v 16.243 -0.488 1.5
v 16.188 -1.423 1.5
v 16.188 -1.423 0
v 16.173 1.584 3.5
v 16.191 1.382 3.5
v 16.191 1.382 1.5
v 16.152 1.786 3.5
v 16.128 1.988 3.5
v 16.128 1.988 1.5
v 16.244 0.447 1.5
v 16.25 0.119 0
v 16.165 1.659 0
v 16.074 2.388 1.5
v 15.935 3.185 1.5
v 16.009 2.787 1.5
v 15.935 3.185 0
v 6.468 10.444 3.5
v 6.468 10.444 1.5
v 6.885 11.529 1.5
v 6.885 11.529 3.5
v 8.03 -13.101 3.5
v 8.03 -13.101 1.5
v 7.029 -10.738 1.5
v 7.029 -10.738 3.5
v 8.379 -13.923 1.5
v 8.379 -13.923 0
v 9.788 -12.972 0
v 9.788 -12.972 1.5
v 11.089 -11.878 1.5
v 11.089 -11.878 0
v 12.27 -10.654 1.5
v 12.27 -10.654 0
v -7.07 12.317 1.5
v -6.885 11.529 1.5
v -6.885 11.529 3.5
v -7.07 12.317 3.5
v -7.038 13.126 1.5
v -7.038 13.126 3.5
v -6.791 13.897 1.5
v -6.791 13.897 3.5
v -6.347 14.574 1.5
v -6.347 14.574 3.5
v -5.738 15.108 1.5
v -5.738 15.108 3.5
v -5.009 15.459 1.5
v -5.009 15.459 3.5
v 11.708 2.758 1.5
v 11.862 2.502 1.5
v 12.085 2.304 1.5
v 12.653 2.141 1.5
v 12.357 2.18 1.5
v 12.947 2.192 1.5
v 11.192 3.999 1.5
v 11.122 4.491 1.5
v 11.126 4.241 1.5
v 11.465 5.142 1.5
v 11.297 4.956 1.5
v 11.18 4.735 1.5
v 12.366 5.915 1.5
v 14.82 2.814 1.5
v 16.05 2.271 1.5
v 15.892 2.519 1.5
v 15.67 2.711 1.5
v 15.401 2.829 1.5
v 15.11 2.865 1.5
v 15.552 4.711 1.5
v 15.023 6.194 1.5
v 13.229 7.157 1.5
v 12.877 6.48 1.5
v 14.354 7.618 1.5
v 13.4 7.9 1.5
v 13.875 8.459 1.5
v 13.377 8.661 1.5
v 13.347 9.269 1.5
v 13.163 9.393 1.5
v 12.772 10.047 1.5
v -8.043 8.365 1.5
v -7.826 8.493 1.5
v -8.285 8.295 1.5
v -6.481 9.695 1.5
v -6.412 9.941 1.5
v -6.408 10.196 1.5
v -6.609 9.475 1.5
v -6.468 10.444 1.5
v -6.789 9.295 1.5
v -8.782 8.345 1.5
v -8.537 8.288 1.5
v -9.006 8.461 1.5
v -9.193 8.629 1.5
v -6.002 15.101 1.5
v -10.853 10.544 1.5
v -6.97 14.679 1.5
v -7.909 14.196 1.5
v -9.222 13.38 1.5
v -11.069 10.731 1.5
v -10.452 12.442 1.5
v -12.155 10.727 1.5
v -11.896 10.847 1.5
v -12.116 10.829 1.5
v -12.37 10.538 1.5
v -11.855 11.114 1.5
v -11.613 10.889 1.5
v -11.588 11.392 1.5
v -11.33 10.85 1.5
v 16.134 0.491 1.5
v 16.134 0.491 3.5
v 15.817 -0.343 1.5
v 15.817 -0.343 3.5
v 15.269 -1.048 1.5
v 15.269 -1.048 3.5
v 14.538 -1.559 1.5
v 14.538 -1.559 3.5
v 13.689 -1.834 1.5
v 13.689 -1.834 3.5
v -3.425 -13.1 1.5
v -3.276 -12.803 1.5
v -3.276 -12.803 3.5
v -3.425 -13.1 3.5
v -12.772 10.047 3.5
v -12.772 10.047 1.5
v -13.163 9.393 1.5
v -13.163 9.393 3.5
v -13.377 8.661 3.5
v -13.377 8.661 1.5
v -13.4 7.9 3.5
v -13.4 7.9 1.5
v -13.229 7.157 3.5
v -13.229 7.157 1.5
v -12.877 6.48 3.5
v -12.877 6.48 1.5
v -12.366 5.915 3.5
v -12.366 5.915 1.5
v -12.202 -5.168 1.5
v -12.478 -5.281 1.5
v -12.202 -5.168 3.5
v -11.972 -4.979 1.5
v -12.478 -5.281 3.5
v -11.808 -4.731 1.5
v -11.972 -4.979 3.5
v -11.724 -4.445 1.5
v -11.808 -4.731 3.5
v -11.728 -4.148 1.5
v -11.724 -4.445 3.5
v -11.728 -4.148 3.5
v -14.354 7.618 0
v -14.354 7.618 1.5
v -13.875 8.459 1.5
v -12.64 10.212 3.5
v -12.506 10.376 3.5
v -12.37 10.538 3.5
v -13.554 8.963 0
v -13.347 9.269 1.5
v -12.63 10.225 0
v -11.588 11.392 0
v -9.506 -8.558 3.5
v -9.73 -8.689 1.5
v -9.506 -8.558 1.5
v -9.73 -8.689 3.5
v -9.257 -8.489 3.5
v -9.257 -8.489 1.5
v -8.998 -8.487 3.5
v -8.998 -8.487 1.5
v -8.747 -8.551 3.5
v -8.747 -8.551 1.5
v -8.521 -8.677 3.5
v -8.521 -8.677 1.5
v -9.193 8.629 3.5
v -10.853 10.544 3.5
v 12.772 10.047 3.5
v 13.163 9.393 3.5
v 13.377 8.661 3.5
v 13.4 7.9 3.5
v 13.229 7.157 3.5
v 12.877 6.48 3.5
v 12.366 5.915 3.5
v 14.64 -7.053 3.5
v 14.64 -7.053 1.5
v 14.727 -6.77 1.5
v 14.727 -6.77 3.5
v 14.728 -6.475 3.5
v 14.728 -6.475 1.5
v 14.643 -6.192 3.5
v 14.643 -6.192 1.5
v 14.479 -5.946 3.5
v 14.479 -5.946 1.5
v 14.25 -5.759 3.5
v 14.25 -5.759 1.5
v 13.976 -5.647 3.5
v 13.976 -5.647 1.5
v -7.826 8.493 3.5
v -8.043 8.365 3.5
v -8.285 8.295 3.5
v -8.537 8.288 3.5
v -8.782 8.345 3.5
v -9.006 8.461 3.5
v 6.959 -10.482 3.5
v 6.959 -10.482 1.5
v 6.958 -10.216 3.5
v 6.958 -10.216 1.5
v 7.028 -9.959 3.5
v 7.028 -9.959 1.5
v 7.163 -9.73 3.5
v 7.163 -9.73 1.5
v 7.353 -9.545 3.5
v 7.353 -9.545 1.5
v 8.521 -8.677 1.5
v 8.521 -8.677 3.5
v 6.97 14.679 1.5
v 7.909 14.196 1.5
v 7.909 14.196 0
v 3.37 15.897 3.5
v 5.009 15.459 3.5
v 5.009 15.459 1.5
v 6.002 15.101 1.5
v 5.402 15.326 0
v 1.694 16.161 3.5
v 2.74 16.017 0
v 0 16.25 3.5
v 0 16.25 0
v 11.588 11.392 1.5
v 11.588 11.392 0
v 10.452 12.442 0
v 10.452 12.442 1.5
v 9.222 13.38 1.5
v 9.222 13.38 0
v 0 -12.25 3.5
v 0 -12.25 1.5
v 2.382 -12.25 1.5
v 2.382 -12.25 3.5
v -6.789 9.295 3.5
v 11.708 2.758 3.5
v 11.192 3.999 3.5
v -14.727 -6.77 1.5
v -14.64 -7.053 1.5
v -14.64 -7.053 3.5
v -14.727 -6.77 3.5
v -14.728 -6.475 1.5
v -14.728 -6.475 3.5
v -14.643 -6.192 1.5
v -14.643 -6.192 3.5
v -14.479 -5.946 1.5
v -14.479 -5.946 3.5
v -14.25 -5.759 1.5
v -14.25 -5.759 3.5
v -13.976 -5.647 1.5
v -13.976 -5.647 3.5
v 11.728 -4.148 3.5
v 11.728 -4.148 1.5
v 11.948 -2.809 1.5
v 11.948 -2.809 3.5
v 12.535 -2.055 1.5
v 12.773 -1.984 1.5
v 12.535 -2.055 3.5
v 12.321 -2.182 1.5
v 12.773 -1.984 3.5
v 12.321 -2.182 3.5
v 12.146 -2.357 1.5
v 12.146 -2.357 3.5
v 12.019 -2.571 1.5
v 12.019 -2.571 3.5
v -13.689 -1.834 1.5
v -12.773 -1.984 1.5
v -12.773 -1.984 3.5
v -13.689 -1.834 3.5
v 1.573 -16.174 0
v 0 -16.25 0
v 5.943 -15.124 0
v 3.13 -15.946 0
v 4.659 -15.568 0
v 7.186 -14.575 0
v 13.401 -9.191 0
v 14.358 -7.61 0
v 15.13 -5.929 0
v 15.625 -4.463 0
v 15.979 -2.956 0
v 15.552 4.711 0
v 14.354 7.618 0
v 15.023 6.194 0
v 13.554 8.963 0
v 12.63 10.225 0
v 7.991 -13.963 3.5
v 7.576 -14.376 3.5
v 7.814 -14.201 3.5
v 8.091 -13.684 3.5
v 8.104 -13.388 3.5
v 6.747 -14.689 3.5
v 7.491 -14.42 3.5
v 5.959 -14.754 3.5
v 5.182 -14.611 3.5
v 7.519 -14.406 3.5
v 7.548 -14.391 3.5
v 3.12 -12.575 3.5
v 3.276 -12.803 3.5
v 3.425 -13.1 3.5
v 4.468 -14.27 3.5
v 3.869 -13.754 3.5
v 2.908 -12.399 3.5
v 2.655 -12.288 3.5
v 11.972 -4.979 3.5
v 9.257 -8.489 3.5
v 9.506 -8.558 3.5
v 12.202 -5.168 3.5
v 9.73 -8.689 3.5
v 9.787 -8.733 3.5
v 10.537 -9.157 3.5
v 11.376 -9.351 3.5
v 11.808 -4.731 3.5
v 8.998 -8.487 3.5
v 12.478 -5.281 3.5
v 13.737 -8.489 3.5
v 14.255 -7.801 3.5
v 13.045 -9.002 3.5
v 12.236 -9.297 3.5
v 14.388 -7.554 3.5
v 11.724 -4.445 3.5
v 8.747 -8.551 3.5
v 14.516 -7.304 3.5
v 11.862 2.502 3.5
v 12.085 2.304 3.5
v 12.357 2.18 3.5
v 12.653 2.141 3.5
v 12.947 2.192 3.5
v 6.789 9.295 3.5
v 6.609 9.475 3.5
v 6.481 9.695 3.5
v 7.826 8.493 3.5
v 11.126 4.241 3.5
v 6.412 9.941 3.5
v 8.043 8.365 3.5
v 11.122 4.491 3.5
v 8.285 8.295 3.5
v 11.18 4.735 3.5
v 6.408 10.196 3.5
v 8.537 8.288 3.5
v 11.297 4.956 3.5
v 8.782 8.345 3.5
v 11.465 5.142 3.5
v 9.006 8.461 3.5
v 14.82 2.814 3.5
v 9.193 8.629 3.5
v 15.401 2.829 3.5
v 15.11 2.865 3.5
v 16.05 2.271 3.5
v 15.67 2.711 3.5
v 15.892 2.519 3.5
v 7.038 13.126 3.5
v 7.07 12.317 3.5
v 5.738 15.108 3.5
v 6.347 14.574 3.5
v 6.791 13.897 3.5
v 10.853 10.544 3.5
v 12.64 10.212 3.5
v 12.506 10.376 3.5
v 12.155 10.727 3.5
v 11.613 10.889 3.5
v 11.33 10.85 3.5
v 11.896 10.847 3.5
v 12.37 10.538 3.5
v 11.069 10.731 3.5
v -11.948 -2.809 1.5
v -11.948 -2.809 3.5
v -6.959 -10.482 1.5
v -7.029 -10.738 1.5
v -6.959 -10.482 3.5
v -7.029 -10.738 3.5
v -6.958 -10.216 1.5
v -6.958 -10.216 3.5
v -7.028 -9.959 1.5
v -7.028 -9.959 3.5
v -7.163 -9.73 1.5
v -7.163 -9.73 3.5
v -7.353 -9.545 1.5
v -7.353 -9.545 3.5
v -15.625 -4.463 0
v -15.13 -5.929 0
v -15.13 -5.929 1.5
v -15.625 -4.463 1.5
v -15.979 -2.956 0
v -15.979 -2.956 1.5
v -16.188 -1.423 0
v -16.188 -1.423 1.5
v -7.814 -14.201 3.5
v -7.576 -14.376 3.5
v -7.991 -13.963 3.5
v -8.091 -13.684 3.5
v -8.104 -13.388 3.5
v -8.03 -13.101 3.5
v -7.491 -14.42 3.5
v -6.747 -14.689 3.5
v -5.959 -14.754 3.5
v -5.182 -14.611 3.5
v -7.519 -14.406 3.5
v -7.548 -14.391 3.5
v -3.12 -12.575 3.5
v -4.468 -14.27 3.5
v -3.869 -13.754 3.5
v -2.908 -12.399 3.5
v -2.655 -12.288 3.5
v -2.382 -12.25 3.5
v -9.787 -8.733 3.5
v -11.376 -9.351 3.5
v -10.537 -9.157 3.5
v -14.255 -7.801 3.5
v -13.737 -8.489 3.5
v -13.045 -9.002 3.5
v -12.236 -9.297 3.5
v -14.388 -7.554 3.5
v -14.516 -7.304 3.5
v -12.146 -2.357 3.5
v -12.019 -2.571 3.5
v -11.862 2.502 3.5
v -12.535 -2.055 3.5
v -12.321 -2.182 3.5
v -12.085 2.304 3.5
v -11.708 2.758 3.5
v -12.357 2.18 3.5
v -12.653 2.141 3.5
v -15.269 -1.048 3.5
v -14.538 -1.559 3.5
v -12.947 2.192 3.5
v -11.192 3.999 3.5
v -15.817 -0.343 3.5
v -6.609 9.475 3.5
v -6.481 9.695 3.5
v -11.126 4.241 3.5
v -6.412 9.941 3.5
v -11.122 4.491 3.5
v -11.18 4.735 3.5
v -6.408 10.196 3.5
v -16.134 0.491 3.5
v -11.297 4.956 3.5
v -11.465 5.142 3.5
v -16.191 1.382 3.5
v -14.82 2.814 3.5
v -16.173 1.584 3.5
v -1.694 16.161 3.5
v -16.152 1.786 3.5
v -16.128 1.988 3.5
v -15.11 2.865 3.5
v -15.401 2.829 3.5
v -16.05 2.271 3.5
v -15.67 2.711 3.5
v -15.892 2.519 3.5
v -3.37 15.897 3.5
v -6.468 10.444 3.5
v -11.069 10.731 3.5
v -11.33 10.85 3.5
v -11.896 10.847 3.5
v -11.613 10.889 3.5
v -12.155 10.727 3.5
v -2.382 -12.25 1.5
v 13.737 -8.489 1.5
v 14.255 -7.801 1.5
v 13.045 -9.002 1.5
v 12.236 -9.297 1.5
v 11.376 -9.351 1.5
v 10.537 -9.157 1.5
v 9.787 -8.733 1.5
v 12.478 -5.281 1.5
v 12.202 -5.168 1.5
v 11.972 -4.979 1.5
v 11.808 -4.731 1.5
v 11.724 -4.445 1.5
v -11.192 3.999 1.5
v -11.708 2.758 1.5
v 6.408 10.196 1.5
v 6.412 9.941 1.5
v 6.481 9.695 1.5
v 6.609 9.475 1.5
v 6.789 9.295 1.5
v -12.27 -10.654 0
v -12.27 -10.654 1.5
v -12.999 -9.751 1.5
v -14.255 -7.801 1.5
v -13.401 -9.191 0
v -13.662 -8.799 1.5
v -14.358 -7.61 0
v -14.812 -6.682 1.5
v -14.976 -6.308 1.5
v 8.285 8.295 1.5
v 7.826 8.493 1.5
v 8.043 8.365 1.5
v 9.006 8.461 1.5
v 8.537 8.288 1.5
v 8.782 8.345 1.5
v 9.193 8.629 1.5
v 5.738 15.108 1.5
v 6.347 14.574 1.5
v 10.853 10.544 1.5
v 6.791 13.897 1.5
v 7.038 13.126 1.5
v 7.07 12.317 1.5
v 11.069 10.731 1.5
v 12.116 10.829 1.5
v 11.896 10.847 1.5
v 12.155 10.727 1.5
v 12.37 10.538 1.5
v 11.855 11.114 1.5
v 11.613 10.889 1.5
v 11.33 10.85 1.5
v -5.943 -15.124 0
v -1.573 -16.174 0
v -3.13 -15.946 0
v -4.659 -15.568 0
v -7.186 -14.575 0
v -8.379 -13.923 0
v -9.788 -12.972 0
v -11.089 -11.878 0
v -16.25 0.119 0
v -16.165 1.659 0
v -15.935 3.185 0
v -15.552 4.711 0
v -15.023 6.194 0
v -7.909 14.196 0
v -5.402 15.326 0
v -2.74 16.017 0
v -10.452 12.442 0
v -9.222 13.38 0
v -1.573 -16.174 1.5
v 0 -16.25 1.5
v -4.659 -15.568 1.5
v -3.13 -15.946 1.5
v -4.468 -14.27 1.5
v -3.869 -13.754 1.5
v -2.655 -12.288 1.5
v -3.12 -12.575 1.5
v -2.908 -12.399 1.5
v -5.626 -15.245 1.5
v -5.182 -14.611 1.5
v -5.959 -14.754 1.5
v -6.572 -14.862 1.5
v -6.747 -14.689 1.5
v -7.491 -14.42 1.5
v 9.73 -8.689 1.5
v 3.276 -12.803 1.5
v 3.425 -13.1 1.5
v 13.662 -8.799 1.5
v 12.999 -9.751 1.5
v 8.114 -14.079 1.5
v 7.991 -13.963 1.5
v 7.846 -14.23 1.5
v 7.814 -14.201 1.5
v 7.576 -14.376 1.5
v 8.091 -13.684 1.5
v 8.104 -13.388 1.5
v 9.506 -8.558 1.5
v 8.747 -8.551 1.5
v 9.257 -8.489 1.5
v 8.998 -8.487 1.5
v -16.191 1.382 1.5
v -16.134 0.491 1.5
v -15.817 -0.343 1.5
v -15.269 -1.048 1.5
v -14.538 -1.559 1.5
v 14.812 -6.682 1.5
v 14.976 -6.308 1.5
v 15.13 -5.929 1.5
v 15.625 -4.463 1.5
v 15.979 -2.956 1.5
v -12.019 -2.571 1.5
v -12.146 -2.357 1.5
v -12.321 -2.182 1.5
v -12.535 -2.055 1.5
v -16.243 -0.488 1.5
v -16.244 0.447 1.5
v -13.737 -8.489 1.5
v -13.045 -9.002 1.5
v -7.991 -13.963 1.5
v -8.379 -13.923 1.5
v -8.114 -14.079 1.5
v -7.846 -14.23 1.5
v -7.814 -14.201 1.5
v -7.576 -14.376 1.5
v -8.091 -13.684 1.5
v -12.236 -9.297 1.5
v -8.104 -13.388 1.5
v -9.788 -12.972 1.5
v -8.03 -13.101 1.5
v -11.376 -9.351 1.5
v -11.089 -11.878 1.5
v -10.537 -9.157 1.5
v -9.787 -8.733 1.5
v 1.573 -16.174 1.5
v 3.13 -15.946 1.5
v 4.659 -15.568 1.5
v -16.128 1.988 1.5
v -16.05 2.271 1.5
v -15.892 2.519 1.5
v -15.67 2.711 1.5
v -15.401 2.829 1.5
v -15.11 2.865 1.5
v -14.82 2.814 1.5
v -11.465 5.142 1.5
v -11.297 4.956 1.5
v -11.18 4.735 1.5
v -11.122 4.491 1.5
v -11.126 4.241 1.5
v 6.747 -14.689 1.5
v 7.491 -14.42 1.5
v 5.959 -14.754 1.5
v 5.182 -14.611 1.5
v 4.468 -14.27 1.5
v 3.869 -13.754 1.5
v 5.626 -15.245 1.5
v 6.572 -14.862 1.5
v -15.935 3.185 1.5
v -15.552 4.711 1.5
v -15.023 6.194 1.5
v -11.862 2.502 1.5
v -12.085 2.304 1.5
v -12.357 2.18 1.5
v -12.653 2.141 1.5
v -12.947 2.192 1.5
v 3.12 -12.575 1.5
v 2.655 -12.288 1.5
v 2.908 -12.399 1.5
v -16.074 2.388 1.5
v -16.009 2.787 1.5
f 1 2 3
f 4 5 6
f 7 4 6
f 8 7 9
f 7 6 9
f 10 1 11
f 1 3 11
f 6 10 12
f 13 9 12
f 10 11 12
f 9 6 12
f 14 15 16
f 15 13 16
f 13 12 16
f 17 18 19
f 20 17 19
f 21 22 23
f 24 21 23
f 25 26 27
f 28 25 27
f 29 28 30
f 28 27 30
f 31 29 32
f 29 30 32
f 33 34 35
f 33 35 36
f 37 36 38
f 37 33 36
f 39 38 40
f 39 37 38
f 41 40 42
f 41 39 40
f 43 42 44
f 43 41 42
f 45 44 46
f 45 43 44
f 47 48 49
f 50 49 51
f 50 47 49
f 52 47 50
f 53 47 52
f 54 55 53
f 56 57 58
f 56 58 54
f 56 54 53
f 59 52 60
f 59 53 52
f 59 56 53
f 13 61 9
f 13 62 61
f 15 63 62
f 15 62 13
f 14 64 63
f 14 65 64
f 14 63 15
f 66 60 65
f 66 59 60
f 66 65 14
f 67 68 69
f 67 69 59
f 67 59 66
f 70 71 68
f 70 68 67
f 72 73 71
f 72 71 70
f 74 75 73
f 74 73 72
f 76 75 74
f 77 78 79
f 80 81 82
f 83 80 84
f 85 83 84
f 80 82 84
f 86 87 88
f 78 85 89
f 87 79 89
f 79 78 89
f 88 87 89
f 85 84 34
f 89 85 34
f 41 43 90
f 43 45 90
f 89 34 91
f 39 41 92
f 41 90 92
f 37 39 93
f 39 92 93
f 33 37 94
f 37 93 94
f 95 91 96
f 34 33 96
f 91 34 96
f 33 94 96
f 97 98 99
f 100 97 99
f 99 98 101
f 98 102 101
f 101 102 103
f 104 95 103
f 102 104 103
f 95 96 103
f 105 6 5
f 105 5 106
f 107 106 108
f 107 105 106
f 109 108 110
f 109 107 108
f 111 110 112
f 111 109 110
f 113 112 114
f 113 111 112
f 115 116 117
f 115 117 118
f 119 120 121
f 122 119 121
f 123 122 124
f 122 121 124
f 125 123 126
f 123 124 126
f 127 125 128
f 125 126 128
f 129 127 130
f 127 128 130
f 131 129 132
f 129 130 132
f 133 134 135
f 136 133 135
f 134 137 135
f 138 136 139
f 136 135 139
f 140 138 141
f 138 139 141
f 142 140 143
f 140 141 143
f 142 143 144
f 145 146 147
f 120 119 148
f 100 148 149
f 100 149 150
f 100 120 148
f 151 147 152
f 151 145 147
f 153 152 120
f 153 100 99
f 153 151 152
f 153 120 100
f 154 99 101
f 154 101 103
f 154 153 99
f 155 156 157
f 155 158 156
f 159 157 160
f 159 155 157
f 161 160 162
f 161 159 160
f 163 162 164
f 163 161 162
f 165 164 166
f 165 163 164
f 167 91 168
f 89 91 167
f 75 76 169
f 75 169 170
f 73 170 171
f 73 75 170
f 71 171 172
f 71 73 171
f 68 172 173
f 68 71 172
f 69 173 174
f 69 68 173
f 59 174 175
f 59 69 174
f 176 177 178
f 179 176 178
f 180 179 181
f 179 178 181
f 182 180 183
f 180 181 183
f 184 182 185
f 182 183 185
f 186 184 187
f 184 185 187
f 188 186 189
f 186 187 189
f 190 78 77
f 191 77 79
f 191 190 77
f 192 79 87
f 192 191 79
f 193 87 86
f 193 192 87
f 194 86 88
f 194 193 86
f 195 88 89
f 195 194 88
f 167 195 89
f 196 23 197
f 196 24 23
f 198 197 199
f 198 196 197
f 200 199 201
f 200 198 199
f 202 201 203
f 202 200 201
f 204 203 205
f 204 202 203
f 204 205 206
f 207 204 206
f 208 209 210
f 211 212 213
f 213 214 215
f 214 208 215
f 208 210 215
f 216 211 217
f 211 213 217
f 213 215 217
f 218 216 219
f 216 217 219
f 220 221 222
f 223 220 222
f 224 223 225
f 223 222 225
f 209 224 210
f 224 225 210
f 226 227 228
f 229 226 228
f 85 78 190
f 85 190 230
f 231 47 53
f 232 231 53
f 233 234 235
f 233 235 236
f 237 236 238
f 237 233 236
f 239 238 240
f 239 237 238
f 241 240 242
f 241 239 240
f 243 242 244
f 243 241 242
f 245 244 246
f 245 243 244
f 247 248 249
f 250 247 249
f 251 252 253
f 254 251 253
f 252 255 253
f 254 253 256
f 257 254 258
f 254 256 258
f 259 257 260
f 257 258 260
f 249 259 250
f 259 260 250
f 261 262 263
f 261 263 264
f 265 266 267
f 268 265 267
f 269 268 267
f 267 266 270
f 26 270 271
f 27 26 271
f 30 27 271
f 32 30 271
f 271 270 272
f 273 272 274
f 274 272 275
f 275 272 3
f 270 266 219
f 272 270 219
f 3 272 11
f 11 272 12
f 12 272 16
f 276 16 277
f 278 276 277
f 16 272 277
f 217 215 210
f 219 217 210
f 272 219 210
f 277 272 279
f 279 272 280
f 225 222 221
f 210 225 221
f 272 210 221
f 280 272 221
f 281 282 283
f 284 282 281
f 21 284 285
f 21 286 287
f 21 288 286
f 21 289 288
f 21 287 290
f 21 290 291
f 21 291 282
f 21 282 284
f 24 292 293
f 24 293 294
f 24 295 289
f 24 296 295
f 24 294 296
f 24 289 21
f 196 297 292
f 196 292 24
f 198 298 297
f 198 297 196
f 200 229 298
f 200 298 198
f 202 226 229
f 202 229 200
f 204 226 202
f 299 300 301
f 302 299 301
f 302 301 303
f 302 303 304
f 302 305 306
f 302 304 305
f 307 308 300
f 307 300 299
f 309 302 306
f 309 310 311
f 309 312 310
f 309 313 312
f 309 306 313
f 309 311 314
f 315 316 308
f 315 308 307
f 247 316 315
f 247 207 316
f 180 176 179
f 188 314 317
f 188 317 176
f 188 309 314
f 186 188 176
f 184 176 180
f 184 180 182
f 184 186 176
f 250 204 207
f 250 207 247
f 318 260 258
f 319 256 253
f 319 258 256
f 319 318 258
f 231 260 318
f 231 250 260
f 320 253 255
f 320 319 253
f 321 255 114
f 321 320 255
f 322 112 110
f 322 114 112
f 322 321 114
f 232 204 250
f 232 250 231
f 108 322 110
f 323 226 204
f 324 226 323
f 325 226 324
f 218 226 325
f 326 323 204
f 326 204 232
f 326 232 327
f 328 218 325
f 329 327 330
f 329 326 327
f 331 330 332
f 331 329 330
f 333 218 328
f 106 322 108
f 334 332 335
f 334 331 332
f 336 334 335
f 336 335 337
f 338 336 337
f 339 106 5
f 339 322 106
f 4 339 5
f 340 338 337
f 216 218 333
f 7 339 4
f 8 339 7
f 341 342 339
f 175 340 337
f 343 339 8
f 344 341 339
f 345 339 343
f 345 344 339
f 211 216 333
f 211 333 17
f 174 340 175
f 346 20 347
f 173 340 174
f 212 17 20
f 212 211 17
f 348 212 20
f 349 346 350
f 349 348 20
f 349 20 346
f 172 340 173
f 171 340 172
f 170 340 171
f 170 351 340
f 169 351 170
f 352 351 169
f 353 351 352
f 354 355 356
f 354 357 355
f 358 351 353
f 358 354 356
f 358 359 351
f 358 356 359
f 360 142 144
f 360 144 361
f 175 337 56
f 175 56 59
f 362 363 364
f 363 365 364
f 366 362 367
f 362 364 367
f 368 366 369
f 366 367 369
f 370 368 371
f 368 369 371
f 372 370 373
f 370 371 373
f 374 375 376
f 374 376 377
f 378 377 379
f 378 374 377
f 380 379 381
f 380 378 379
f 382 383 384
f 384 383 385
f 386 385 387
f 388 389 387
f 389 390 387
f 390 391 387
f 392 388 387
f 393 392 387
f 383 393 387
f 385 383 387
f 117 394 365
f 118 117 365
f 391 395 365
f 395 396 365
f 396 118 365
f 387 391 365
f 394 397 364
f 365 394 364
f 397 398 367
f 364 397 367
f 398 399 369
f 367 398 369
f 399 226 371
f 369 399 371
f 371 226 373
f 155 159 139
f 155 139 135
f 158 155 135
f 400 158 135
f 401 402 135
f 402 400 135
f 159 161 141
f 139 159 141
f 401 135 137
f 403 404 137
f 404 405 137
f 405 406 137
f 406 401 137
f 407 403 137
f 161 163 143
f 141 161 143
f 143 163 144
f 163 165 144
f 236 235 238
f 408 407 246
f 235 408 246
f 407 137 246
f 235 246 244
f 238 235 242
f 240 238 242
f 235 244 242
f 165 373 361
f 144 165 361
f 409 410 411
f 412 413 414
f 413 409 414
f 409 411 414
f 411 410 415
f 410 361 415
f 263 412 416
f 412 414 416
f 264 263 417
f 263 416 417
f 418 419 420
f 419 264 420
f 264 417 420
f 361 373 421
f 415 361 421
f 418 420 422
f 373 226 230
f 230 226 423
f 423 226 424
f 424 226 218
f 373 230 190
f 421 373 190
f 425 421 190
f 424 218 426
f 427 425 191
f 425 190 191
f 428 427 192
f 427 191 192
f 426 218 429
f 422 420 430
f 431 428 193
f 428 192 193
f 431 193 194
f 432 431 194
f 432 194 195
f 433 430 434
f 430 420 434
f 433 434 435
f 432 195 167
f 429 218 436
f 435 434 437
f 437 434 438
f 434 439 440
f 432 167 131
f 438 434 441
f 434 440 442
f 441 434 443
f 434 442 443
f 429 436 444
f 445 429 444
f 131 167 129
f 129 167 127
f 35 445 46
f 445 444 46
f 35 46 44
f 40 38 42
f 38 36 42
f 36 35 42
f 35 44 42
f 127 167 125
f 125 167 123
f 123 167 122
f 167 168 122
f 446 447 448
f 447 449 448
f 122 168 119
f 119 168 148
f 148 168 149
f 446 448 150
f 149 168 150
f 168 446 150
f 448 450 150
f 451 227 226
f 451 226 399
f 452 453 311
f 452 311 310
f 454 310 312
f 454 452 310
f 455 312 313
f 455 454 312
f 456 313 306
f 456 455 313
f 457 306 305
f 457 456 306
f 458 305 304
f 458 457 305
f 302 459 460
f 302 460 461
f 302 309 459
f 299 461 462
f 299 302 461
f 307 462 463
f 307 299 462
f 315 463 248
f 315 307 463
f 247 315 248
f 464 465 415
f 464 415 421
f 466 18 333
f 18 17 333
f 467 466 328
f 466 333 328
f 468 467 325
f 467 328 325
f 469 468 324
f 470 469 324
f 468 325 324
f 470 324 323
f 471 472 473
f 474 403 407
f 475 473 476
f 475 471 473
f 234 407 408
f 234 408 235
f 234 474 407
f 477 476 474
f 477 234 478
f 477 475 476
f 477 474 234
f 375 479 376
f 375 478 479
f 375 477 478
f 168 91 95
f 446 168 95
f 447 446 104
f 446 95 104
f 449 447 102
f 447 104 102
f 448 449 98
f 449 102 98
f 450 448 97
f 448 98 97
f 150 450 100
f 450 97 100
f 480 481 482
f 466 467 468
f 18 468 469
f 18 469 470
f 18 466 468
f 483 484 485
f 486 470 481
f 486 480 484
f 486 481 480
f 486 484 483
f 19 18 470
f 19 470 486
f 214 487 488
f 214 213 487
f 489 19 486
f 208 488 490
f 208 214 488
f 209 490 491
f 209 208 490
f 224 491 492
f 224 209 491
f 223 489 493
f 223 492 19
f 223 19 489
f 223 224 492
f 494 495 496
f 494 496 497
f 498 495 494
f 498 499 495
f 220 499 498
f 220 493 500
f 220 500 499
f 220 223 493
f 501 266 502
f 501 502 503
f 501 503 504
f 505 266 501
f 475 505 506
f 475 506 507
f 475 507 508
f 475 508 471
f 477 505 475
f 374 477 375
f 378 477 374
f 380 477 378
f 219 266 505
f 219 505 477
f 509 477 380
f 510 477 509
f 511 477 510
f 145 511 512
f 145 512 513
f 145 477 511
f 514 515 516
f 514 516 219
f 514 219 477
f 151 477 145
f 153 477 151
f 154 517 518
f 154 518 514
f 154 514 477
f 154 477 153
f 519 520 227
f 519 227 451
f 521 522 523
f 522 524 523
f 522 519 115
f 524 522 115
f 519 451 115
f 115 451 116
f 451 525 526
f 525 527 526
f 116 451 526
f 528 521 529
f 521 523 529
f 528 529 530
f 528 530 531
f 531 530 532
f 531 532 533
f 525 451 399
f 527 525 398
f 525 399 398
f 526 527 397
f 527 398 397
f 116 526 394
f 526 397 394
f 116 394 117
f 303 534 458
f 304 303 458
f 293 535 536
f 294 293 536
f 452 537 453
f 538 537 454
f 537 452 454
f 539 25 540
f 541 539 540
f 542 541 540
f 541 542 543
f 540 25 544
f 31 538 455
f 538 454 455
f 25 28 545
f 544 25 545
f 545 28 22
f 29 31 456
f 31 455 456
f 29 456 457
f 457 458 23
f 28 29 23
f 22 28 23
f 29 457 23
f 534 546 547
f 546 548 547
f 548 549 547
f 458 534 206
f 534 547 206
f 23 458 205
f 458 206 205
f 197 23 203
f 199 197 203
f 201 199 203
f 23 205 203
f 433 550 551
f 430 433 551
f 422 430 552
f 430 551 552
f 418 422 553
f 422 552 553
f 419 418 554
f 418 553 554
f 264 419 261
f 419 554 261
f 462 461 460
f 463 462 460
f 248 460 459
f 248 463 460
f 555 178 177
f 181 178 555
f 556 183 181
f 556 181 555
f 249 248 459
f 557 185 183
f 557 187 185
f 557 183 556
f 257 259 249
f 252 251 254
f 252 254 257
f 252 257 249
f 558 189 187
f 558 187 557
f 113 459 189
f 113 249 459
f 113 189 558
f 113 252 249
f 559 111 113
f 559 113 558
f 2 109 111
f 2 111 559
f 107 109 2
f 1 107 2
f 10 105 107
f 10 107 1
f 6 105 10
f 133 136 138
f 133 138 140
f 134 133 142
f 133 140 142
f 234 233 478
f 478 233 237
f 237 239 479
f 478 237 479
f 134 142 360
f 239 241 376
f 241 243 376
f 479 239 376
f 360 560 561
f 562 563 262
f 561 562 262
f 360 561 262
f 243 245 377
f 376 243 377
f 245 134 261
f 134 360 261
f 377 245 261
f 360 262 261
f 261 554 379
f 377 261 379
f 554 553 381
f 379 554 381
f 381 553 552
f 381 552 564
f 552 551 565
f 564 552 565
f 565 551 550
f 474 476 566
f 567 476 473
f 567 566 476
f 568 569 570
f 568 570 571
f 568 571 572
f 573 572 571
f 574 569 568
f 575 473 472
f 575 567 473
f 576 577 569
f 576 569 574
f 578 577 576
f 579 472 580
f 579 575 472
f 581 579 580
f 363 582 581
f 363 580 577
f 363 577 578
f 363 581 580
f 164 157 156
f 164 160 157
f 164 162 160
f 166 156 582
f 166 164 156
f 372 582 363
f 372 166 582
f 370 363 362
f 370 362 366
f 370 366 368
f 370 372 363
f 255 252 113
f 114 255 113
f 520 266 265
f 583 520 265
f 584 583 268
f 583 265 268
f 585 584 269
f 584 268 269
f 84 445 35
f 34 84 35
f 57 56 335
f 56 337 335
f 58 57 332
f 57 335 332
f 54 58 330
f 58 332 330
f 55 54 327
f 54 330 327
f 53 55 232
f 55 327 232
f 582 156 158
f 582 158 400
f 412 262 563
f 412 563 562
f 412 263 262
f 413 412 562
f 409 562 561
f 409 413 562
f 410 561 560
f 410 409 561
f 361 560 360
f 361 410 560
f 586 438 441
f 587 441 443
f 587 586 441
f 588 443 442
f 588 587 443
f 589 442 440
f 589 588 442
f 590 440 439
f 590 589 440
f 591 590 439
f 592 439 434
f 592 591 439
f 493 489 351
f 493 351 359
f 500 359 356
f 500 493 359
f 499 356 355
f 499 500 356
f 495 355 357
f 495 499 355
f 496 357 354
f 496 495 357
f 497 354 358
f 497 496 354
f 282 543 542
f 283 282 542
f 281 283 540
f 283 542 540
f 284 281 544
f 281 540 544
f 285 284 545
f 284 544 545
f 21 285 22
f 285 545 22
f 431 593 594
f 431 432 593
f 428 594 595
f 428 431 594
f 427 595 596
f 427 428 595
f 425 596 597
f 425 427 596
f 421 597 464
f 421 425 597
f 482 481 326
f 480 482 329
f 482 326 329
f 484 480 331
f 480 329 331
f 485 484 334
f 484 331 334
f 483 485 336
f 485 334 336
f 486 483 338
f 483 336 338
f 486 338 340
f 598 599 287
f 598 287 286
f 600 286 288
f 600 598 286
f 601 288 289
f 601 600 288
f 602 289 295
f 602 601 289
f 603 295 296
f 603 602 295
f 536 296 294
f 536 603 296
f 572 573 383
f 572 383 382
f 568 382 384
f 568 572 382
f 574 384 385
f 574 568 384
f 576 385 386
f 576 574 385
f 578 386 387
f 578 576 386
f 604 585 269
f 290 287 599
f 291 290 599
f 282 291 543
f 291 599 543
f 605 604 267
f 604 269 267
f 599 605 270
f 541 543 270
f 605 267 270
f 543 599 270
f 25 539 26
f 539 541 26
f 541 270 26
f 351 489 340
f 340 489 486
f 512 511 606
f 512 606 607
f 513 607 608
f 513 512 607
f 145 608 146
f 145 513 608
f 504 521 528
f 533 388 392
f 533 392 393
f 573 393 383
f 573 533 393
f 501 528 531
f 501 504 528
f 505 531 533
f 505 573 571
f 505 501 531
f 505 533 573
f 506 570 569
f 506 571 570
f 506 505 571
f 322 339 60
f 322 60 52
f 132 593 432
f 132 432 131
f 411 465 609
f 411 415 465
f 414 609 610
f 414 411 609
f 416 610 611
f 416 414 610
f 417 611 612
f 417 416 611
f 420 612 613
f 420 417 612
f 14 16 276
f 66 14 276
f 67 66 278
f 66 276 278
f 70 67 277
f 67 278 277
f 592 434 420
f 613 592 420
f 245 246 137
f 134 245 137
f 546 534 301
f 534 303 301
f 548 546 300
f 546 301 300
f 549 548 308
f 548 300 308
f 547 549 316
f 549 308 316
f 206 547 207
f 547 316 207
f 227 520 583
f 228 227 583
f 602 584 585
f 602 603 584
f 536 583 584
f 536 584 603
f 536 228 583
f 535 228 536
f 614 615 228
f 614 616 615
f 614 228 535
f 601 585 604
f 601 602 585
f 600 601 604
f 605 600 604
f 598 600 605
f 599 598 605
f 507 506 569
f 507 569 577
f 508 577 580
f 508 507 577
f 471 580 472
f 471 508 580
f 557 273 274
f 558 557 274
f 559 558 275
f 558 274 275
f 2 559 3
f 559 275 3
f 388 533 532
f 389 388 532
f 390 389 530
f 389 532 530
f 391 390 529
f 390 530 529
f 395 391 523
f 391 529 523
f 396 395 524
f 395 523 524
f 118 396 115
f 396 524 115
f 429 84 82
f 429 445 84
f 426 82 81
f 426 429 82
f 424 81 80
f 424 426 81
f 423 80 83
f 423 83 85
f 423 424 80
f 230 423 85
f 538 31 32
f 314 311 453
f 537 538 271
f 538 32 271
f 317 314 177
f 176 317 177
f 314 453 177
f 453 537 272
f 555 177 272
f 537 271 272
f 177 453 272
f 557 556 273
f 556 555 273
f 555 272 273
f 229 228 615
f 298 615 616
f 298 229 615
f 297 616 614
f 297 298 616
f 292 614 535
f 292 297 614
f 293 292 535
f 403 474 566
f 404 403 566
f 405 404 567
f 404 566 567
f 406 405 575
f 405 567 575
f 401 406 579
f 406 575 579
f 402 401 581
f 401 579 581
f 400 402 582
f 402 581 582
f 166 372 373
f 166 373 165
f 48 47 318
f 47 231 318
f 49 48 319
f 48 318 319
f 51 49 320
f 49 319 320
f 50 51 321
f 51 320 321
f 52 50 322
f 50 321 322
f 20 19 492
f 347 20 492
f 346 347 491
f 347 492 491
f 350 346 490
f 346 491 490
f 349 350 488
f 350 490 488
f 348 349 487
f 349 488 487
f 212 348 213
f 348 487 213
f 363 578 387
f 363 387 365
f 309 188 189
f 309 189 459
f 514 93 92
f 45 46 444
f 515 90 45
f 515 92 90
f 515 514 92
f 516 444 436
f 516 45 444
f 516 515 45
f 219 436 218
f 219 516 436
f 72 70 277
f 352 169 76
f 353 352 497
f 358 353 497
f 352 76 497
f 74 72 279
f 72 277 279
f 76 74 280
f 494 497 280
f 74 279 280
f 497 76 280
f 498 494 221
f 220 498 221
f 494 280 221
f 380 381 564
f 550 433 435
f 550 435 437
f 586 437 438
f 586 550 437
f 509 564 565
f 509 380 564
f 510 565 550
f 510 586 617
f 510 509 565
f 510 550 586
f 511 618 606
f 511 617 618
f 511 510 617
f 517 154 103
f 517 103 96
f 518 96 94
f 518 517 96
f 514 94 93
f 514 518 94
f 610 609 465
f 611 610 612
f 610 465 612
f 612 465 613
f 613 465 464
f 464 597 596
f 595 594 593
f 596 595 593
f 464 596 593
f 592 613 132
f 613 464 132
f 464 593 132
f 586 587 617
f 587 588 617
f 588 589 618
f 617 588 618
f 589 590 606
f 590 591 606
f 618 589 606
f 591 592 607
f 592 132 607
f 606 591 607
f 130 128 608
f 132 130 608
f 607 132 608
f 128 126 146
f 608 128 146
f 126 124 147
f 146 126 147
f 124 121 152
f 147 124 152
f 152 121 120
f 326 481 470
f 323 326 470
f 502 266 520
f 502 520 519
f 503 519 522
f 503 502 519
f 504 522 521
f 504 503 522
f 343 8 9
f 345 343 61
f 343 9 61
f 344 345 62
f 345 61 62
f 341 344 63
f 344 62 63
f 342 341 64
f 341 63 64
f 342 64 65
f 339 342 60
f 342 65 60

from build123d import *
from build123d import SkipClean  # not in build123d's __all__

# Parameters (mm, degrees)
F1_DEPTH    = 1.5
F2_DEPTH    = 3.5
F3_R        = 1
F4_R        = 1
F5_T1_DEPTH = 9.63963589
F5_T3_DEPTH = 10.6906794787
F5_T5_DEPTH = 9.0103178495
F5_T7_DEPTH = 9.246443515
F5_T9_DEPTH = 9.9071921997
F6_T1_DEPTH = 4.304276514
F6_T3_DEPTH = 5.0643678136
F6_T5_DEPTH = 5.03100669
F6_T7_DEPTH = 4.8959965939


# Not quite as in the source:
# - a fillet or chamfer that OpenCascade refuses, or shapes differently, is made with other operations: its cross-section is extruded or revolved along the edge and cut away or added
# - a feature names something its author has since deleted; it is built from what else it names


with BuildPart() as f1:
    # F0 (on Top) → F1 (new body)
    with BuildSketch(Plane.XY):
        with BuildLine():
            Line((0, -12.25), (0, -16.25))
            ThreePointArc((0, -16.25), (2.3542947693, -16.0785508097), (4.6589105316, -15.5678210633))
            Line((4.6589105316, -15.5678210633), (3, -12.25))
            Line((3, -12.25), (0, -12.25))
        make_face()
        with BuildLine():
            Line((3, -12.25), (4.6589105316, -15.5678210633))
            ThreePointArc((4.6589105316, -15.5678210633), (6.5703749152, -14.8624585272), (8.3785487777, -13.9234485807))
            Line((8.3785487777, -13.9234485807), (6.722135955, -10.0139320225))
            Line((6.722135955, -10.0139320225), (9.1300793123, -8.2245721403))
            Line((9.1300793123, -8.2245721403), (12.269716972, -10.6544143635))
            ThreePointArc((12.269716972, -10.6544143635), (13.901957351, -8.4141596021), (15.1297175637, -5.9290932226))
            Line((15.1297175637, -5.9290932226), (11.5782397372, -5.0612652418))
            Line((11.5782397372, -5.0612652418), (12.0646680977, -2.1009633231))
            Line((12.0646680977, -2.1009633231), (16.187616292, -1.4225254948))
            ThreePointArc((16.187616292, -1.4225254948), (16.2256082415, 0.890020895), (15.9349057476, 3.184537457))
            Line((15.9349057476, 3.184537457), (12.0646680977, 1.8990366769))
            Line((12.0646680977, 1.8990366769), (10.9139659303, 4.6695753469))
            Line((10.9139659303, 4.6695753469), (14.3535137791, 7.6183424833))
            ThreePointArc((14.3535137791, 7.6183424833), (13.1072409386, 9.6053492897), (11.5878961133, 11.3922413803))
            Line((11.5878961133, 11.3922413803), (8.5738108299, 7.9135966332))
            Line((8.5738108299, 7.9135966332), (6.2013811224, 9.7497821584))
            Line((6.2013811224, 9.7497821584), (7.9085498801, 14.1956802864))
            ThreePointArc((7.9085498801, 14.1956802864), (4.08550458, 15.7280371416), (0, 16.25))
            Line((0, 16.25), (0, -12.25))
            Line((0, -12.25), (3, -12.25))
        make_face()
        with BuildLine():
            Line((6.722135955, -10.0139320225), (8.3785487777, -13.9234485807))
            ThreePointArc((8.3785487777, -13.9234485807), (10.4527204974, -12.4419907653), (12.269716972, -10.6544143635))
            Line((12.269716972, -10.6544143635), (9.1300793123, -8.2245721403))
            Line((9.1300793123, -8.2245721403), (6.722135955, -10.0139320225))
        make_face()
        with BuildLine():
            ThreePointArc((11.5878961133, 11.3922413803), (9.8484856206, 12.9255495427), (7.9085498801, 14.1956802864))
            Line((7.9085498801, 14.1956802864), (6.2013811224, 9.7497821584))
            Line((6.2013811224, 9.7497821584), (8.5738108299, 7.9135966332))
            Line((8.5738108299, 7.9135966332), (11.5878961133, 11.3922413803))
        make_face()
        with BuildLine():
            Line((11.5782397372, -5.0612652418), (15.1297175637, -5.9290932226))
            ThreePointArc((15.1297175637, -5.9290932226), (15.8199601178, -3.7136722892), (16.187616292, -1.4225254948))
            Line((16.187616292, -1.4225254948), (12.0646680977, -2.1009633231))
            Line((12.0646680977, -2.1009633231), (11.5782397372, -5.0612652418))
        make_face()
        with BuildLine():
            ThreePointArc((15.9349057476, 3.184537457), (15.3056115889, 5.4590066762), (14.3535137791, 7.6183424833))
            Line((14.3535137791, 7.6183424833), (10.9139659303, 4.6695753469))
            Line((10.9139659303, 4.6695753469), (12.0646680977, 1.8990366769))
            Line((12.0646680977, 1.8990366769), (15.9349057476, 3.184537457))
        make_face()
    extrude(amount=F1_DEPTH)

    # F0 (on Top) → F2 (join)
    with BuildSketch(Plane.XY):
        with BuildLine():
            Line((3, -12.25), (4.6589105316, -15.5678210633))
            ThreePointArc((4.6589105316, -15.5678210633), (6.5703749152, -14.8624585272), (8.3785487777, -13.9234485807))
            Line((8.3785487777, -13.9234485807), (6.722135955, -10.0139320225))
            Line((6.722135955, -10.0139320225), (9.1300793123, -8.2245721403))
            Line((9.1300793123, -8.2245721403), (12.269716972, -10.6544143635))
            ThreePointArc((12.269716972, -10.6544143635), (13.901957351, -8.4141596021), (15.1297175637, -5.9290932226))
            Line((15.1297175637, -5.9290932226), (11.5782397372, -5.0612652418))
            Line((11.5782397372, -5.0612652418), (12.0646680977, -2.1009633231))
            Line((12.0646680977, -2.1009633231), (16.187616292, -1.4225254948))
            ThreePointArc((16.187616292, -1.4225254948), (16.2256082415, 0.890020895), (15.9349057476, 3.184537457))
            Line((15.9349057476, 3.184537457), (12.0646680977, 1.8990366769))
            Line((12.0646680977, 1.8990366769), (10.9139659303, 4.6695753469))
            Line((10.9139659303, 4.6695753469), (14.3535137791, 7.6183424833))
            ThreePointArc((14.3535137791, 7.6183424833), (13.1072409386, 9.6053492897), (11.5878961133, 11.3922413803))
            Line((11.5878961133, 11.3922413803), (8.5738108299, 7.9135966332))
            Line((8.5738108299, 7.9135966332), (6.2013811224, 9.7497821584))
            Line((6.2013811224, 9.7497821584), (7.9085498801, 14.1956802864))
            ThreePointArc((7.9085498801, 14.1956802864), (4.08550458, 15.7280371416), (0, 16.25))
            Line((0, 16.25), (0, -12.25))
            Line((0, -12.25), (3, -12.25))
        make_face()
    extrude(amount=F2_DEPTH)

    # F3
    f3_edges = [f1.edges().sort_by_distance(p)[0] for p in [
        (3, -12.25, 2.5),
        (9.130079, -8.224572, 2.5),
        (12.064668, -2.100963, 2.5),
        (10.913966, 4.669575, 2.5),
        (6.201381, 9.749782, 2.5),
    ]]
    fillet(f3_edges, radius=F3_R)

    # F4
    f4_edges = [f1.edges().sort_by_distance(p)[0] for p in [
        (12.064668, 1.899037, 2.5),
        (11.57824, -5.061265, 2.5),
        (6.722136, -10.013932, 2.5),
        (8.573811, 7.913597, 2.5),
    ]]
    fillet(f4_edges, radius=F4_R)

    # F5: fillet of radius 3 on 5 edges, made by hand

    # F5_s2 → F5_t1 (cut)
    with BuildSketch(Plane.XY.offset(1.5)):
        with BuildLine():
            ThreePointArc((7.4911310936, -14.4203139681), (5.1815062569, -14.6114030066), (3.4248714726, -13.0997429451))
            Line((3.4248714726, -13.0997429451), (4.6589105316, -15.5678210633))
            ThreePointArc((4.6589105316, -15.5678210633), (6.1020546546, -15.0607911144), (7.4911310936, -14.4203139681))
        make_face()
    extrude(amount=F5_T1_DEPTH, mode=Mode.SUBTRACT)

    # F5_s4 → F5_t3 (cut)
    with BuildSketch(Plane.XY.offset(1.5)):
        with BuildLine():
            ThreePointArc((14.2551270077, -7.800888026), (12.2362296702, -9.2974660849), (9.7872909338, -8.7332042566))
            Line((9.7872909338, -8.7332042566), (12.269716972, -10.6544143635))
            ThreePointArc((12.269716972, -10.6544143635), (13.3389463668, -9.2808948827), (14.2551270077, -7.800888026))
        make_face()
    extrude(amount=F5_T3_DEPTH, mode=Mode.SUBTRACT)

    # F5_s6 → F5_t5 (cut)
    with BuildSketch(Plane.XY.offset(1.5)):
        with BuildLine():
            ThreePointArc((16.1911606466, 1.381599405), (15.5696234502, -0.7158737175), (13.6891275029, -1.833655887))
            Line((13.6891275029, -1.833655887), (16.187616292, -1.4225254948))
            ThreePointArc((16.187616292, -1.4225254948), (16.2499870192, -0.0205396402), (16.1911606466, 1.381599405))
        make_face()
    extrude(amount=F5_T5_DEPTH, mode=Mode.SUBTRACT)

    # F5_s8 → F5_t7 (cut)
    with BuildSketch(Plane.XY.offset(1.5)):
        with BuildLine():
            ThreePointArc((12.7716701145, 10.0472355644), (13.3995013522, 7.899570062), (12.3664200817, 5.91478235))
            Line((12.3664200817, 5.91478235), (14.3535137791, 7.6183424833))
            ThreePointArc((14.3535137791, 7.6183424833), (13.6168564917, 8.8681294129), (12.7716701145, 10.0472355644))
        make_face()
    extrude(amount=F5_T7_DEPTH, mode=Mode.SUBTRACT)

    # F5_s10 → F5_t9 (cut)
    with BuildSketch(Plane.XY.offset(1.5)):
        with BuildLine():
            ThreePointArc((6.8847518154, 11.529451843), (6.7914209513, 13.8973561582), (5.0088339231, 15.4587865866))
            ThreePointArc((5.0088339231, 15.4587865866), (6.4894961639, 14.8979508503), (7.9085498801, 14.1956802864))
            Line((7.9085498801, 14.1956802864), (6.8847518154, 11.529451843))
        make_face()
    extrude(amount=F5_T9_DEPTH, mode=Mode.SUBTRACT)

    # F6: fillet of radius 1 on 4 edges, made by hand

    # F6_s2 → F6_t1 (cut)
    with BuildSketch(Plane.XY.offset(1.5)):
        with BuildLine():
            ThreePointArc((7.5756414815, -14.3760966936), (8.0513569254, -13.827282659), (8.0302135849, -13.1012971306))
            Line((8.0302135849, -13.1012971306), (8.3785487777, -13.9234485807))
            ThreePointArc((8.3785487777, -13.9234485807), (7.9803050872, -14.1554664605), (7.5756414815, -14.3760966936))
        make_face()
    extrude(amount=F6_T1_DEPTH, mode=Mode.SUBTRACT)

    # F6_s4 → F6_t3 (cut)
    with BuildSketch(Plane.XY.offset(1.5)):
        with BuildLine():
            ThreePointArc((14.6397584076, -7.0526572132), (14.6431333932, -6.1917144023), (13.9762230064, -5.6472289111))
            Line((13.9762230064, -5.6472289111), (15.1297175637, -5.9290932226))
            ThreePointArc((15.1297175637, -5.9290932226), (14.8953356428, -6.4954966006), (14.6397584076, -7.0526572132))
        make_face()
    extrude(amount=F6_T3_DEPTH, mode=Mode.SUBTRACT)

    # F6_s6 → F6_t5 (cut)
    with BuildSketch(Plane.XY.offset(1.5)):
        with BuildLine():
            ThreePointArc((16.1279854606, 1.9876078546), (15.6698492509, 2.7105535541), (14.82027687, 2.8143130881))
            Line((14.82027687, 2.8143130881), (15.9349057476, 3.184537457))
            ThreePointArc((15.9349057476, 3.184537457), (16.0426122647, 2.5878739778), (16.1279854606, 1.9876078546))
        make_face()
    extrude(amount=F6_T5_DEPTH, mode=Mode.SUBTRACT)

    # F6_s8 → F6_t7 (cut)
    with BuildSketch(Plane.XY.offset(1.5)):
        with BuildLine():
            ThreePointArc((10.8530428687, 10.544125571), (11.613004552, 10.8892780785), (12.3700450766, 10.5377646967))
            ThreePointArc((12.3700450766, 10.5377646967), (11.9865870504, 10.9719747942), (11.5878961133, 11.3922413803))
            Line((11.5878961133, 11.3922413803), (10.8530428687, 10.544125571))
        make_face()
    extrude(amount=F6_T7_DEPTH, mode=Mode.SUBTRACT)

    # F7: F1 across face


with BuildPart() as f1_1:
    add(f1.part, clean=False)
    with SkipClean():  # cleaning this boolean's faces spoils the solid; the shape is the same uncleaned
        add(f1.part.mirror(Plane(origin=(0, 1.0780141844, 1.6932624113), x_dir=(0, -1, 0), z_dir=(-1, 0, 0))), clean=False)


solid = f1_1.part
